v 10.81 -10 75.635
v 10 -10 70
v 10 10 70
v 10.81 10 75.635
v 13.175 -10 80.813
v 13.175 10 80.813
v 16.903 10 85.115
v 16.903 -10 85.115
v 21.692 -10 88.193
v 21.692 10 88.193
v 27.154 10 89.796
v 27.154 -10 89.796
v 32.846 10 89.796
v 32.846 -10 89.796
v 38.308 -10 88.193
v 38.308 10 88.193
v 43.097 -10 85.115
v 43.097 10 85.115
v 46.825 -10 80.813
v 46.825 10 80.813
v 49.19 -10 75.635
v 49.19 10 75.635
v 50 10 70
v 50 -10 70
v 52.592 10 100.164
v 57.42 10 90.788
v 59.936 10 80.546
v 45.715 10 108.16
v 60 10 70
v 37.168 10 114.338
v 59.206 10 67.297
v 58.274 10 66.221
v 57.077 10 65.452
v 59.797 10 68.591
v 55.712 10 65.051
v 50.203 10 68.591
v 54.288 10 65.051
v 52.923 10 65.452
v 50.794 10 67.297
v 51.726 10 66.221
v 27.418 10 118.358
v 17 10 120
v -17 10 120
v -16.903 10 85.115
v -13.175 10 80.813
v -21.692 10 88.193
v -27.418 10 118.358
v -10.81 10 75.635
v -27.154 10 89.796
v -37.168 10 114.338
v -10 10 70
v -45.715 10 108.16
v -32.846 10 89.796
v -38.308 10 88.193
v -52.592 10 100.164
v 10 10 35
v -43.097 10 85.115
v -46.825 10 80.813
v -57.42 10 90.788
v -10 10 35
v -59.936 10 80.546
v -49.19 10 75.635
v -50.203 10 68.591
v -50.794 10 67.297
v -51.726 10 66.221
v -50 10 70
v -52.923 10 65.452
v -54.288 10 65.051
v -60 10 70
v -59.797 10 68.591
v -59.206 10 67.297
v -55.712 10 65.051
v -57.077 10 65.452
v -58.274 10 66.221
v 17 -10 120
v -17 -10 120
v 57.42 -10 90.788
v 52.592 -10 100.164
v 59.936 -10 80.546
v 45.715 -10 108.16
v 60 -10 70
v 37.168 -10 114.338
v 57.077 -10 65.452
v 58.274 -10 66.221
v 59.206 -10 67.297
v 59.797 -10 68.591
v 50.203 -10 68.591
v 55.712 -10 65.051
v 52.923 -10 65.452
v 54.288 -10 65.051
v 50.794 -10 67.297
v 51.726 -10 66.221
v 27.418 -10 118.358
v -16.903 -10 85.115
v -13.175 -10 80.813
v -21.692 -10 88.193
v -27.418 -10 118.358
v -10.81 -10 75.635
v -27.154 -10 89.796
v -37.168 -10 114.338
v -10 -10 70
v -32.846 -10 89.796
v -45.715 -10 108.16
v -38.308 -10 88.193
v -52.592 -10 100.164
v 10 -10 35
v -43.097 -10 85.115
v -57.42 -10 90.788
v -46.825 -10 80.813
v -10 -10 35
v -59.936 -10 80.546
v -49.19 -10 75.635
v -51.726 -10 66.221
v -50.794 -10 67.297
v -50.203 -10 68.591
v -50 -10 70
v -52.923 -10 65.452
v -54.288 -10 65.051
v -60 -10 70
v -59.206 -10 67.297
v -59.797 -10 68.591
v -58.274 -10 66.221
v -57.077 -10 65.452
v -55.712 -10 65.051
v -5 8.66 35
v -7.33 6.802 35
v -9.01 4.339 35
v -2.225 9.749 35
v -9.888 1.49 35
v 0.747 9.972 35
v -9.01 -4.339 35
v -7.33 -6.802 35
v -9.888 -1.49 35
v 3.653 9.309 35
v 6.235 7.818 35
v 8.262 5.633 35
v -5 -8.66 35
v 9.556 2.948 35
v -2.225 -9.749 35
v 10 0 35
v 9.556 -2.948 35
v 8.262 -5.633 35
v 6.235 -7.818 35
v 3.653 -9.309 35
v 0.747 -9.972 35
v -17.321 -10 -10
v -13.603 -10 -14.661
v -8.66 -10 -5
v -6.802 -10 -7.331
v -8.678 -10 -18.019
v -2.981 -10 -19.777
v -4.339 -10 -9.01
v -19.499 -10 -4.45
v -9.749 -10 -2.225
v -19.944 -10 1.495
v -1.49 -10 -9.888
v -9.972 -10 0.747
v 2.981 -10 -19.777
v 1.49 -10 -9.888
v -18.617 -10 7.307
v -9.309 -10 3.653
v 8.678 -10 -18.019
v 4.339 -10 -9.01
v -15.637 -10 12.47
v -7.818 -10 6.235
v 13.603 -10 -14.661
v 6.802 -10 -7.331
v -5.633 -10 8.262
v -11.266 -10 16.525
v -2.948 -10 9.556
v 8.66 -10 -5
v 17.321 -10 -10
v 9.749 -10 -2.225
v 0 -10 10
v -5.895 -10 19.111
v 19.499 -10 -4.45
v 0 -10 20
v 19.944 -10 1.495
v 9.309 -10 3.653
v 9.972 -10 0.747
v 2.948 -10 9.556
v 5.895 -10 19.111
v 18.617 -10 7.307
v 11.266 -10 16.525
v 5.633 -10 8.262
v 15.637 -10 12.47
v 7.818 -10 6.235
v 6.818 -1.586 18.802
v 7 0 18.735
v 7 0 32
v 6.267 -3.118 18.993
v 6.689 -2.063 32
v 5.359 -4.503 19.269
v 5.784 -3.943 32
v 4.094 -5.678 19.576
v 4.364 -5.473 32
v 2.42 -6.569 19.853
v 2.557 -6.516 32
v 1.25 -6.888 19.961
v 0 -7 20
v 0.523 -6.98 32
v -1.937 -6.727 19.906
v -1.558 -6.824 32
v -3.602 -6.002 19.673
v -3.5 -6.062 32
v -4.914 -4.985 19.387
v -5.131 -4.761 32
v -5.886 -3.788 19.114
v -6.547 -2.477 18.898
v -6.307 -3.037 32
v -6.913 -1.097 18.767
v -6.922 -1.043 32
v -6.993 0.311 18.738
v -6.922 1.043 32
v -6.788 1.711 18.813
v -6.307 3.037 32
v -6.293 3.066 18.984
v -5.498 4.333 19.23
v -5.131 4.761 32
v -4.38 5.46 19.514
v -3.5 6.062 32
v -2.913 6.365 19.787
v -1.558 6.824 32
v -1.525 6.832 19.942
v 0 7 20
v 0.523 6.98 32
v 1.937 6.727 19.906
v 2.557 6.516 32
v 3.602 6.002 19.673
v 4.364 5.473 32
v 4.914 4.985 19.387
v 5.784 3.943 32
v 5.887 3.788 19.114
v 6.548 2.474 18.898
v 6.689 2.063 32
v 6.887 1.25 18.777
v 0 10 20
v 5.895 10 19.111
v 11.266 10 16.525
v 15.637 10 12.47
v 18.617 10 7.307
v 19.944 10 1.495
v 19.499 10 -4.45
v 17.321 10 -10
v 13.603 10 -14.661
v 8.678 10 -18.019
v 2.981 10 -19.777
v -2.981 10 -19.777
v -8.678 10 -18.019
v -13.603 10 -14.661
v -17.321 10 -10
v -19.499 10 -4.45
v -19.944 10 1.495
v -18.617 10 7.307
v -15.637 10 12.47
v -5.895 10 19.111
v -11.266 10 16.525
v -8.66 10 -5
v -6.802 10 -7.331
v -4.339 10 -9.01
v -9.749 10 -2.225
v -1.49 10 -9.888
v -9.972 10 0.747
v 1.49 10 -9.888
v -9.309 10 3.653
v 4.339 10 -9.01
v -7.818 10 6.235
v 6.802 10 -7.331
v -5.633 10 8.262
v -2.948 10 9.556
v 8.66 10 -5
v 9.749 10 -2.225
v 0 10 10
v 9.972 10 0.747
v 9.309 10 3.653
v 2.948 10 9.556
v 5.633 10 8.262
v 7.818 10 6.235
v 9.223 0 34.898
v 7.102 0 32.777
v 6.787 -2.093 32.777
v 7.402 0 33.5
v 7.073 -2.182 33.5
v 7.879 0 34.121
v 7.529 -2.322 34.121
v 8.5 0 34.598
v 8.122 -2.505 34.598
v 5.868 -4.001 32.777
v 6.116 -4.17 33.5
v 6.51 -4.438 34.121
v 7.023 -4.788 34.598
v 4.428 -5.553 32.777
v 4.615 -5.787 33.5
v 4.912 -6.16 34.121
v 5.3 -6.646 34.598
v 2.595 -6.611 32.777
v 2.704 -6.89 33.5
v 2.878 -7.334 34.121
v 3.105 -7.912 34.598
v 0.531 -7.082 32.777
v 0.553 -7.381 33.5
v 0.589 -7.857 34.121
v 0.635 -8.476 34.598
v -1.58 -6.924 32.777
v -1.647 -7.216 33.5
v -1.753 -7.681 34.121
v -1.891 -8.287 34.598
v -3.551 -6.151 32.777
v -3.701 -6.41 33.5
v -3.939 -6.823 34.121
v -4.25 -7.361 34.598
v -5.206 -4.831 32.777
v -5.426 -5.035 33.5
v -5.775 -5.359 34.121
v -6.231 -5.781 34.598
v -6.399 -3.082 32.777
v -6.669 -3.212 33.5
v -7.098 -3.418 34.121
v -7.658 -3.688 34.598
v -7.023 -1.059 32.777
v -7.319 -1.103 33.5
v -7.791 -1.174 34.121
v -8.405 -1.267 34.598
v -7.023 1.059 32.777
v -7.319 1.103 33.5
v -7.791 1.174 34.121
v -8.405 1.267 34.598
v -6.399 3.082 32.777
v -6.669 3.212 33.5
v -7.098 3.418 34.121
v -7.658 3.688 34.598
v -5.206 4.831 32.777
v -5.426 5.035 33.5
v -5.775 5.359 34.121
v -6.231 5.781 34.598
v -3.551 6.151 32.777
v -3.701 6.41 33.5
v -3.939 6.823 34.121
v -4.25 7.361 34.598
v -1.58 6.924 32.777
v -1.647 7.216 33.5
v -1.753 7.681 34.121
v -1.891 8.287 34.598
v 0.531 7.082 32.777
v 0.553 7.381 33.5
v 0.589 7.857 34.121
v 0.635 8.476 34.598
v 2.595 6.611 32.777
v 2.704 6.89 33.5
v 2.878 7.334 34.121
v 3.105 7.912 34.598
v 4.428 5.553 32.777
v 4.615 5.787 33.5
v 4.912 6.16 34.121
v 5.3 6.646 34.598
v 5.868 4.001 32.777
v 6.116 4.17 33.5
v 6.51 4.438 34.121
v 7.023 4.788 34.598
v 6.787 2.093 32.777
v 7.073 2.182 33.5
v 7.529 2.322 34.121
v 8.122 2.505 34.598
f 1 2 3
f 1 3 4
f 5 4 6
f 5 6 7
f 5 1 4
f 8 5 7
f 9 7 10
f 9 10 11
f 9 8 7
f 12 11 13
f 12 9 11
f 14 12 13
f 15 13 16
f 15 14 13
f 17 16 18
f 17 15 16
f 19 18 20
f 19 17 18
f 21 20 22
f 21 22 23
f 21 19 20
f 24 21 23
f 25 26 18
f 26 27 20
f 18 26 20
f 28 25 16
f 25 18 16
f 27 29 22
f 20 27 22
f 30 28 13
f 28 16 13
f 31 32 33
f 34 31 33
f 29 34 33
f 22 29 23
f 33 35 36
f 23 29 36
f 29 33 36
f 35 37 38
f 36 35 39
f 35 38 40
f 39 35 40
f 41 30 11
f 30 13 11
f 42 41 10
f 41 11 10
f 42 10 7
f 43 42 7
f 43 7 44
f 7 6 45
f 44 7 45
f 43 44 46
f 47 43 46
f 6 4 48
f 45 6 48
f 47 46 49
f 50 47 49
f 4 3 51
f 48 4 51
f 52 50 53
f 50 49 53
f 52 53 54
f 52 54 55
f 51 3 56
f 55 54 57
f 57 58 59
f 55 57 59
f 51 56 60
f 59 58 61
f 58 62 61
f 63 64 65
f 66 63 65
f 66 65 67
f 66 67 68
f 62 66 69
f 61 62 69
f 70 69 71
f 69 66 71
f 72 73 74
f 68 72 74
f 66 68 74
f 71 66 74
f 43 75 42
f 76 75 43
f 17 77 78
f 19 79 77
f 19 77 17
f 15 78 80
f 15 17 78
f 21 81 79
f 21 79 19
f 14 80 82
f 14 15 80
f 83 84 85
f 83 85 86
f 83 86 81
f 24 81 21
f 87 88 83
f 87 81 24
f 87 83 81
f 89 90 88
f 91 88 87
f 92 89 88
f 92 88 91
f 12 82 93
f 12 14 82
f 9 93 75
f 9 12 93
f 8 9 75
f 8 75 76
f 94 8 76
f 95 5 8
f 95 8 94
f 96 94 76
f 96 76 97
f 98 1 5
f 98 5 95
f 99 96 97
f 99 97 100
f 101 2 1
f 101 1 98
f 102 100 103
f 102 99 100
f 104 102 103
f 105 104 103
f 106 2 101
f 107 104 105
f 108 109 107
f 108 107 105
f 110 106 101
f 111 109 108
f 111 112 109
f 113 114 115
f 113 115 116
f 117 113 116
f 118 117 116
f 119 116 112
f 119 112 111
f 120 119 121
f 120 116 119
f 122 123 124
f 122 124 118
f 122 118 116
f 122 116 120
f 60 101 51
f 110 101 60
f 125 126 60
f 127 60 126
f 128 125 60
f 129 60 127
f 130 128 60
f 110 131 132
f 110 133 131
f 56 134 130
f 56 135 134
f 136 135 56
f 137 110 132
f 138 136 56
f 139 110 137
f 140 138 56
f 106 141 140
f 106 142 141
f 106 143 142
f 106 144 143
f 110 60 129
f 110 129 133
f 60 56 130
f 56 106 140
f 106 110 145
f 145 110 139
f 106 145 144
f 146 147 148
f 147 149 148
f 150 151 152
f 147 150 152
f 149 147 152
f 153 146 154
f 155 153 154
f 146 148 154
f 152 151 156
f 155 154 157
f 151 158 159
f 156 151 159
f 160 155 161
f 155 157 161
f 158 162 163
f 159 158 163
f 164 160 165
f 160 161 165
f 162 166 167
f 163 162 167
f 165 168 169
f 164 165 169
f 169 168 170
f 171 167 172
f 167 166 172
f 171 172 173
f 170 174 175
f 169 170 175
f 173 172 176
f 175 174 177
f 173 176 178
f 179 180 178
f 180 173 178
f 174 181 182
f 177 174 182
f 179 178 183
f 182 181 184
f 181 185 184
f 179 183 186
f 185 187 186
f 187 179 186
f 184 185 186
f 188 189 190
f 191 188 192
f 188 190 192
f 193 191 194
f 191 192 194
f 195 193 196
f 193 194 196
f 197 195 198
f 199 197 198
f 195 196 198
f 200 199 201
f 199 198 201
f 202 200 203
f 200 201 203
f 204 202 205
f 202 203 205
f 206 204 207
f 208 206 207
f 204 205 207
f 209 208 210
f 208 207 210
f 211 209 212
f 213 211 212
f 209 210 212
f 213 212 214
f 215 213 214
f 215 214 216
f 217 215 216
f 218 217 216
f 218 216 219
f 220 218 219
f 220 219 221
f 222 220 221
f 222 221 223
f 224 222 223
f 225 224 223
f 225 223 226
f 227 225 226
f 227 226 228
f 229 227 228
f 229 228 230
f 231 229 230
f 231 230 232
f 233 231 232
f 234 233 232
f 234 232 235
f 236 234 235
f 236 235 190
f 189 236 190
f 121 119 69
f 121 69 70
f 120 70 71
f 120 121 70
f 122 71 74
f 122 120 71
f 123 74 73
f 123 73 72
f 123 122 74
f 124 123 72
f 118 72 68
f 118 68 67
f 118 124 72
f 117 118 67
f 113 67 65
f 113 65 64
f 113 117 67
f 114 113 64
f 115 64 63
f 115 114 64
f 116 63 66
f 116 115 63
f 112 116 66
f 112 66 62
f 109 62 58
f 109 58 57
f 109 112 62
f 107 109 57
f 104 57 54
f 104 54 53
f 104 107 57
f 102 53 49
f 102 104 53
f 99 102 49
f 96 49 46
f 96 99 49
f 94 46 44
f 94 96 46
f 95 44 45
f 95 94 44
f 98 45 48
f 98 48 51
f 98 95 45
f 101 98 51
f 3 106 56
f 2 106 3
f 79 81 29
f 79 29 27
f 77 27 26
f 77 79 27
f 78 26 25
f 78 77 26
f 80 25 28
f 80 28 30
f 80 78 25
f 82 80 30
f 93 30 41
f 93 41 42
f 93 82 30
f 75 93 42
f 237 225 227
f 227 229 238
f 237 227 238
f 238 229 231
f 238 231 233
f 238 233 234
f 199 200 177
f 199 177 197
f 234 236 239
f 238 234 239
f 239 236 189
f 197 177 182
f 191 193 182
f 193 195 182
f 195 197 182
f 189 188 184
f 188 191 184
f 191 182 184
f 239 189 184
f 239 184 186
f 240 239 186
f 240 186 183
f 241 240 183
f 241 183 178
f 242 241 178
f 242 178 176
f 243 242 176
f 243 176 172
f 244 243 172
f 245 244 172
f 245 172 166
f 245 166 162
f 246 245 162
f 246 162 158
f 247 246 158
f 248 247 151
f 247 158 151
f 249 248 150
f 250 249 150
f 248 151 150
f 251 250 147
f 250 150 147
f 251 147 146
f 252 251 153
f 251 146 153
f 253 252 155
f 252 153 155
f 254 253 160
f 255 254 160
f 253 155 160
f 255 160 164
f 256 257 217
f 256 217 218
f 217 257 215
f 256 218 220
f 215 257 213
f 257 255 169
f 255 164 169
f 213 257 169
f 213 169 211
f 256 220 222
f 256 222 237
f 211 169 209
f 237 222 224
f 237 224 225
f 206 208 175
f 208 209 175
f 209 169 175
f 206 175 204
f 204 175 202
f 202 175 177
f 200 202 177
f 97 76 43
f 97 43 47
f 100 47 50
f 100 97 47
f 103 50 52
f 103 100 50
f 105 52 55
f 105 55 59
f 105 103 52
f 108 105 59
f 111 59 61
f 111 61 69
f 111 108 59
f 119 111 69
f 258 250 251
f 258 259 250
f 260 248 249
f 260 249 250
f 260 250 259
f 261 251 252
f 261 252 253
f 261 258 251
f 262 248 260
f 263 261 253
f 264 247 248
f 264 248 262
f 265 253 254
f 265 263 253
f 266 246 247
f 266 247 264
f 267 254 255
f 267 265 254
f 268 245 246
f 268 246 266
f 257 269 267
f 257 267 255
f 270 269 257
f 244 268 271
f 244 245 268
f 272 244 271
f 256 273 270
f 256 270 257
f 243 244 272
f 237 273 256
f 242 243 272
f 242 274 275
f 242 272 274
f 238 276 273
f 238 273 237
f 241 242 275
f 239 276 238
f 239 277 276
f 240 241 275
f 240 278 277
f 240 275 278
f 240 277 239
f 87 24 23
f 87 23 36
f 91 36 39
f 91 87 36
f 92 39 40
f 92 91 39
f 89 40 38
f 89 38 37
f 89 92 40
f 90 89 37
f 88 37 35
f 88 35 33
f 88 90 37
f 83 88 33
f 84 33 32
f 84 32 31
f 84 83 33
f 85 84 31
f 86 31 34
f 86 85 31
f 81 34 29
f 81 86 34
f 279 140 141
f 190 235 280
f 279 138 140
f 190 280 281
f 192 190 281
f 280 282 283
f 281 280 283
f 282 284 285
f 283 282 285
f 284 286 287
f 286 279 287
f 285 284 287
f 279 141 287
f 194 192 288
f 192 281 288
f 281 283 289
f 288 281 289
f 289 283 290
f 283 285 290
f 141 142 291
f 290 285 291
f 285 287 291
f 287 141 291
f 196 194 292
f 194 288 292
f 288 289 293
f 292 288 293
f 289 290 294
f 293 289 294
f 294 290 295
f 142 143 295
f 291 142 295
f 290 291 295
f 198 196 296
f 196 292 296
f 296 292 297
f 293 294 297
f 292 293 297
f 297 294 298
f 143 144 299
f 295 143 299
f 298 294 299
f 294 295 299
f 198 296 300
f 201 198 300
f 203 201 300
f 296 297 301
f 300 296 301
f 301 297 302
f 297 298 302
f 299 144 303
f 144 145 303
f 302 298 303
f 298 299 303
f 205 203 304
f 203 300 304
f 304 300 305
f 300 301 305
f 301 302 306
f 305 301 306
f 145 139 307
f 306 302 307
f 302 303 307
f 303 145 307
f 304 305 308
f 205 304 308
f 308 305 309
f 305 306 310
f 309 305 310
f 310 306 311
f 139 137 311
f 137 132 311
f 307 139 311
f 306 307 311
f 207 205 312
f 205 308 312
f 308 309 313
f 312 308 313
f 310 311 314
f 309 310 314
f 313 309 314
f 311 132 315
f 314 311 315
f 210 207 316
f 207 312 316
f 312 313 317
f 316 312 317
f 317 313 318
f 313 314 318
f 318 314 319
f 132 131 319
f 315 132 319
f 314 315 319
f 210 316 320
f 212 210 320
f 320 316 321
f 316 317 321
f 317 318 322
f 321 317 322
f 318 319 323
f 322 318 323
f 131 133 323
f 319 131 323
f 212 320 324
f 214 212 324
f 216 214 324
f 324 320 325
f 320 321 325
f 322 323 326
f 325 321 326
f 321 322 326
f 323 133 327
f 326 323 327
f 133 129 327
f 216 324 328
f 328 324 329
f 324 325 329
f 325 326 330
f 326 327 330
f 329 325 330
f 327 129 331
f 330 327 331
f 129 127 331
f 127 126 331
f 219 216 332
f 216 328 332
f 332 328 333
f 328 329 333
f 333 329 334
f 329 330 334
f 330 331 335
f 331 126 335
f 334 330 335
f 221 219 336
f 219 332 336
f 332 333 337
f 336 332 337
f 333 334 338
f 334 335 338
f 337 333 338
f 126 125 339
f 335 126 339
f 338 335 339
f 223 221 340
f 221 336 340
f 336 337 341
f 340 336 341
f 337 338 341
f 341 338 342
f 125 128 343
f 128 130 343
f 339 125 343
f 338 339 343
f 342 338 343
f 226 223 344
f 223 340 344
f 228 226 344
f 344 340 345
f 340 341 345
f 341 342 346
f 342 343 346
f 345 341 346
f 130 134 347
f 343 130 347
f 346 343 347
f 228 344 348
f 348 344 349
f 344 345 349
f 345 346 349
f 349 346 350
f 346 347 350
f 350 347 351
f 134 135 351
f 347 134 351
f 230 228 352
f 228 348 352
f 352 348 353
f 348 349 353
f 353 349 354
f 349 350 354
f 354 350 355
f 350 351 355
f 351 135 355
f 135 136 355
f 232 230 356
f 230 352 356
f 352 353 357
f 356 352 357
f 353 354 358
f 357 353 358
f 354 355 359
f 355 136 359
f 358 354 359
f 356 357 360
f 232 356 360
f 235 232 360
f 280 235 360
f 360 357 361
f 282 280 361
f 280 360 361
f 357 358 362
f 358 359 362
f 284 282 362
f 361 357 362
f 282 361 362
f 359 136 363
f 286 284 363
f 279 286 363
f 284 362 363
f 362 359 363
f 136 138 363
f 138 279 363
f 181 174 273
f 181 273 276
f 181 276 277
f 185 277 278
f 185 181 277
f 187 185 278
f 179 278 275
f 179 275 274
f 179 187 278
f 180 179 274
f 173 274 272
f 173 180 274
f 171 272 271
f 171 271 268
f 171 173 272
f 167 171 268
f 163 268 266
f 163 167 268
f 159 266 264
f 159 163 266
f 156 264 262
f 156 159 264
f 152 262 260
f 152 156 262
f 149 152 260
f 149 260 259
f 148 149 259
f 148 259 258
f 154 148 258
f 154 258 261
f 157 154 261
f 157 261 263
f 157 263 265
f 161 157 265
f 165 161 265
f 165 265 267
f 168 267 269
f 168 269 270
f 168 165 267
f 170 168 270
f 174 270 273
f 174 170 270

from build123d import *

# Parameters (mm, degrees)
BOSS_EXTRUDE1_DEPTH        = 10
BOSS_EXTRUDE1_DEPTH_BACK   = 10
SKETCH4_R                  = 20
SKETCH4_R_2                = 10
BOSS_EXTRUDE1_2_DEPTH      = 10
BOSS_EXTRUDE1_2_DEPTH_BACK = 10
SKETCH6_R                  = 7
BOSS_EXTRUDE2_DEPTH        = 20
FILLET1_R                  = 3


with BuildPart() as part:
    # Sketch4 → Boss-Extrude1 (new, two sides: drawn at the far end of the back side and taken through both)
    with BuildSketch(Plane(origin=(0, 0, 0), x_dir=(1, 0, 0), z_dir=(0, 1, 0)).offset(-BOSS_EXTRUDE1_DEPTH_BACK)):
        with Locations(Location((0, 0, 0), (0, 0, 270))):
            Circle(SKETCH4_R)
        with Locations(Location((0, 0, 0), (0, 0, 270))):
            Circle(SKETCH4_R_2, mode=Mode.SUBTRACT)
    extrude(amount=BOSS_EXTRUDE1_DEPTH + BOSS_EXTRUDE1_DEPTH_BACK)



with BuildPart() as body_2:
    # Sketch4 → Boss-Extrude1 2 (new, two sides: drawn at the far end of the back side and taken through both)
    with BuildSketch(Plane(origin=(0, 0, 0), x_dir=(1, 0, 0), z_dir=(0, 1, 0)).offset(-BOSS_EXTRUDE1_2_DEPTH_BACK)):
        with BuildLine():
            Line((-10, -35), (10, -35))
            Line((10, -35), (10, -70))
            ThreePointArc((10, -70), (30, -90), (50, -70))
            ThreePointArc((50, -70), (55, -65), (60, -70))
            ThreePointArc((60, -70), (49.38848107, -104.36409372), (17, -120))
            Line((17, -120), (-17, -120))
            ThreePointArc((-17, -120), (-49.38848107, -104.36409372), (-60, -70))
            ThreePointArc((-60, -70), (-55, -65), (-50, -70))
            ThreePointArc((-50, -70), (-30, -90), (-10, -70))
            Line((-10, -70), (-10, -35))
        make_face()
    extrude(amount=BOSS_EXTRUDE1_2_DEPTH + BOSS_EXTRUDE1_2_DEPTH_BACK)


with BuildPart() as part_1:
    add(part.part)

    add(body_2.part)  # Boss-Extrude2 merges body 2
    # Sketch6 → Boss-Extrude2 (add)
    with BuildSketch(Plane(origin=(0, 0, 35), x_dir=(-1, 0, 0), z_dir=(0, 0, -1))):
        with Locations(Location((0, 0, 0), (0, 0, 180))):
            Circle(SKETCH6_R)
    extrude(amount=BOSS_EXTRUDE2_DEPTH)

    # Fillet1
    fillet1_edges = [part_1.edges().sort_by_distance(p)[0] for p in [
        (-7, 0, 35),
    ]]
    fillet(fillet1_edges, radius=FILLET1_R - 0.0001)  # a hair under: the kernel refuses the full size


solid = part_1.part
